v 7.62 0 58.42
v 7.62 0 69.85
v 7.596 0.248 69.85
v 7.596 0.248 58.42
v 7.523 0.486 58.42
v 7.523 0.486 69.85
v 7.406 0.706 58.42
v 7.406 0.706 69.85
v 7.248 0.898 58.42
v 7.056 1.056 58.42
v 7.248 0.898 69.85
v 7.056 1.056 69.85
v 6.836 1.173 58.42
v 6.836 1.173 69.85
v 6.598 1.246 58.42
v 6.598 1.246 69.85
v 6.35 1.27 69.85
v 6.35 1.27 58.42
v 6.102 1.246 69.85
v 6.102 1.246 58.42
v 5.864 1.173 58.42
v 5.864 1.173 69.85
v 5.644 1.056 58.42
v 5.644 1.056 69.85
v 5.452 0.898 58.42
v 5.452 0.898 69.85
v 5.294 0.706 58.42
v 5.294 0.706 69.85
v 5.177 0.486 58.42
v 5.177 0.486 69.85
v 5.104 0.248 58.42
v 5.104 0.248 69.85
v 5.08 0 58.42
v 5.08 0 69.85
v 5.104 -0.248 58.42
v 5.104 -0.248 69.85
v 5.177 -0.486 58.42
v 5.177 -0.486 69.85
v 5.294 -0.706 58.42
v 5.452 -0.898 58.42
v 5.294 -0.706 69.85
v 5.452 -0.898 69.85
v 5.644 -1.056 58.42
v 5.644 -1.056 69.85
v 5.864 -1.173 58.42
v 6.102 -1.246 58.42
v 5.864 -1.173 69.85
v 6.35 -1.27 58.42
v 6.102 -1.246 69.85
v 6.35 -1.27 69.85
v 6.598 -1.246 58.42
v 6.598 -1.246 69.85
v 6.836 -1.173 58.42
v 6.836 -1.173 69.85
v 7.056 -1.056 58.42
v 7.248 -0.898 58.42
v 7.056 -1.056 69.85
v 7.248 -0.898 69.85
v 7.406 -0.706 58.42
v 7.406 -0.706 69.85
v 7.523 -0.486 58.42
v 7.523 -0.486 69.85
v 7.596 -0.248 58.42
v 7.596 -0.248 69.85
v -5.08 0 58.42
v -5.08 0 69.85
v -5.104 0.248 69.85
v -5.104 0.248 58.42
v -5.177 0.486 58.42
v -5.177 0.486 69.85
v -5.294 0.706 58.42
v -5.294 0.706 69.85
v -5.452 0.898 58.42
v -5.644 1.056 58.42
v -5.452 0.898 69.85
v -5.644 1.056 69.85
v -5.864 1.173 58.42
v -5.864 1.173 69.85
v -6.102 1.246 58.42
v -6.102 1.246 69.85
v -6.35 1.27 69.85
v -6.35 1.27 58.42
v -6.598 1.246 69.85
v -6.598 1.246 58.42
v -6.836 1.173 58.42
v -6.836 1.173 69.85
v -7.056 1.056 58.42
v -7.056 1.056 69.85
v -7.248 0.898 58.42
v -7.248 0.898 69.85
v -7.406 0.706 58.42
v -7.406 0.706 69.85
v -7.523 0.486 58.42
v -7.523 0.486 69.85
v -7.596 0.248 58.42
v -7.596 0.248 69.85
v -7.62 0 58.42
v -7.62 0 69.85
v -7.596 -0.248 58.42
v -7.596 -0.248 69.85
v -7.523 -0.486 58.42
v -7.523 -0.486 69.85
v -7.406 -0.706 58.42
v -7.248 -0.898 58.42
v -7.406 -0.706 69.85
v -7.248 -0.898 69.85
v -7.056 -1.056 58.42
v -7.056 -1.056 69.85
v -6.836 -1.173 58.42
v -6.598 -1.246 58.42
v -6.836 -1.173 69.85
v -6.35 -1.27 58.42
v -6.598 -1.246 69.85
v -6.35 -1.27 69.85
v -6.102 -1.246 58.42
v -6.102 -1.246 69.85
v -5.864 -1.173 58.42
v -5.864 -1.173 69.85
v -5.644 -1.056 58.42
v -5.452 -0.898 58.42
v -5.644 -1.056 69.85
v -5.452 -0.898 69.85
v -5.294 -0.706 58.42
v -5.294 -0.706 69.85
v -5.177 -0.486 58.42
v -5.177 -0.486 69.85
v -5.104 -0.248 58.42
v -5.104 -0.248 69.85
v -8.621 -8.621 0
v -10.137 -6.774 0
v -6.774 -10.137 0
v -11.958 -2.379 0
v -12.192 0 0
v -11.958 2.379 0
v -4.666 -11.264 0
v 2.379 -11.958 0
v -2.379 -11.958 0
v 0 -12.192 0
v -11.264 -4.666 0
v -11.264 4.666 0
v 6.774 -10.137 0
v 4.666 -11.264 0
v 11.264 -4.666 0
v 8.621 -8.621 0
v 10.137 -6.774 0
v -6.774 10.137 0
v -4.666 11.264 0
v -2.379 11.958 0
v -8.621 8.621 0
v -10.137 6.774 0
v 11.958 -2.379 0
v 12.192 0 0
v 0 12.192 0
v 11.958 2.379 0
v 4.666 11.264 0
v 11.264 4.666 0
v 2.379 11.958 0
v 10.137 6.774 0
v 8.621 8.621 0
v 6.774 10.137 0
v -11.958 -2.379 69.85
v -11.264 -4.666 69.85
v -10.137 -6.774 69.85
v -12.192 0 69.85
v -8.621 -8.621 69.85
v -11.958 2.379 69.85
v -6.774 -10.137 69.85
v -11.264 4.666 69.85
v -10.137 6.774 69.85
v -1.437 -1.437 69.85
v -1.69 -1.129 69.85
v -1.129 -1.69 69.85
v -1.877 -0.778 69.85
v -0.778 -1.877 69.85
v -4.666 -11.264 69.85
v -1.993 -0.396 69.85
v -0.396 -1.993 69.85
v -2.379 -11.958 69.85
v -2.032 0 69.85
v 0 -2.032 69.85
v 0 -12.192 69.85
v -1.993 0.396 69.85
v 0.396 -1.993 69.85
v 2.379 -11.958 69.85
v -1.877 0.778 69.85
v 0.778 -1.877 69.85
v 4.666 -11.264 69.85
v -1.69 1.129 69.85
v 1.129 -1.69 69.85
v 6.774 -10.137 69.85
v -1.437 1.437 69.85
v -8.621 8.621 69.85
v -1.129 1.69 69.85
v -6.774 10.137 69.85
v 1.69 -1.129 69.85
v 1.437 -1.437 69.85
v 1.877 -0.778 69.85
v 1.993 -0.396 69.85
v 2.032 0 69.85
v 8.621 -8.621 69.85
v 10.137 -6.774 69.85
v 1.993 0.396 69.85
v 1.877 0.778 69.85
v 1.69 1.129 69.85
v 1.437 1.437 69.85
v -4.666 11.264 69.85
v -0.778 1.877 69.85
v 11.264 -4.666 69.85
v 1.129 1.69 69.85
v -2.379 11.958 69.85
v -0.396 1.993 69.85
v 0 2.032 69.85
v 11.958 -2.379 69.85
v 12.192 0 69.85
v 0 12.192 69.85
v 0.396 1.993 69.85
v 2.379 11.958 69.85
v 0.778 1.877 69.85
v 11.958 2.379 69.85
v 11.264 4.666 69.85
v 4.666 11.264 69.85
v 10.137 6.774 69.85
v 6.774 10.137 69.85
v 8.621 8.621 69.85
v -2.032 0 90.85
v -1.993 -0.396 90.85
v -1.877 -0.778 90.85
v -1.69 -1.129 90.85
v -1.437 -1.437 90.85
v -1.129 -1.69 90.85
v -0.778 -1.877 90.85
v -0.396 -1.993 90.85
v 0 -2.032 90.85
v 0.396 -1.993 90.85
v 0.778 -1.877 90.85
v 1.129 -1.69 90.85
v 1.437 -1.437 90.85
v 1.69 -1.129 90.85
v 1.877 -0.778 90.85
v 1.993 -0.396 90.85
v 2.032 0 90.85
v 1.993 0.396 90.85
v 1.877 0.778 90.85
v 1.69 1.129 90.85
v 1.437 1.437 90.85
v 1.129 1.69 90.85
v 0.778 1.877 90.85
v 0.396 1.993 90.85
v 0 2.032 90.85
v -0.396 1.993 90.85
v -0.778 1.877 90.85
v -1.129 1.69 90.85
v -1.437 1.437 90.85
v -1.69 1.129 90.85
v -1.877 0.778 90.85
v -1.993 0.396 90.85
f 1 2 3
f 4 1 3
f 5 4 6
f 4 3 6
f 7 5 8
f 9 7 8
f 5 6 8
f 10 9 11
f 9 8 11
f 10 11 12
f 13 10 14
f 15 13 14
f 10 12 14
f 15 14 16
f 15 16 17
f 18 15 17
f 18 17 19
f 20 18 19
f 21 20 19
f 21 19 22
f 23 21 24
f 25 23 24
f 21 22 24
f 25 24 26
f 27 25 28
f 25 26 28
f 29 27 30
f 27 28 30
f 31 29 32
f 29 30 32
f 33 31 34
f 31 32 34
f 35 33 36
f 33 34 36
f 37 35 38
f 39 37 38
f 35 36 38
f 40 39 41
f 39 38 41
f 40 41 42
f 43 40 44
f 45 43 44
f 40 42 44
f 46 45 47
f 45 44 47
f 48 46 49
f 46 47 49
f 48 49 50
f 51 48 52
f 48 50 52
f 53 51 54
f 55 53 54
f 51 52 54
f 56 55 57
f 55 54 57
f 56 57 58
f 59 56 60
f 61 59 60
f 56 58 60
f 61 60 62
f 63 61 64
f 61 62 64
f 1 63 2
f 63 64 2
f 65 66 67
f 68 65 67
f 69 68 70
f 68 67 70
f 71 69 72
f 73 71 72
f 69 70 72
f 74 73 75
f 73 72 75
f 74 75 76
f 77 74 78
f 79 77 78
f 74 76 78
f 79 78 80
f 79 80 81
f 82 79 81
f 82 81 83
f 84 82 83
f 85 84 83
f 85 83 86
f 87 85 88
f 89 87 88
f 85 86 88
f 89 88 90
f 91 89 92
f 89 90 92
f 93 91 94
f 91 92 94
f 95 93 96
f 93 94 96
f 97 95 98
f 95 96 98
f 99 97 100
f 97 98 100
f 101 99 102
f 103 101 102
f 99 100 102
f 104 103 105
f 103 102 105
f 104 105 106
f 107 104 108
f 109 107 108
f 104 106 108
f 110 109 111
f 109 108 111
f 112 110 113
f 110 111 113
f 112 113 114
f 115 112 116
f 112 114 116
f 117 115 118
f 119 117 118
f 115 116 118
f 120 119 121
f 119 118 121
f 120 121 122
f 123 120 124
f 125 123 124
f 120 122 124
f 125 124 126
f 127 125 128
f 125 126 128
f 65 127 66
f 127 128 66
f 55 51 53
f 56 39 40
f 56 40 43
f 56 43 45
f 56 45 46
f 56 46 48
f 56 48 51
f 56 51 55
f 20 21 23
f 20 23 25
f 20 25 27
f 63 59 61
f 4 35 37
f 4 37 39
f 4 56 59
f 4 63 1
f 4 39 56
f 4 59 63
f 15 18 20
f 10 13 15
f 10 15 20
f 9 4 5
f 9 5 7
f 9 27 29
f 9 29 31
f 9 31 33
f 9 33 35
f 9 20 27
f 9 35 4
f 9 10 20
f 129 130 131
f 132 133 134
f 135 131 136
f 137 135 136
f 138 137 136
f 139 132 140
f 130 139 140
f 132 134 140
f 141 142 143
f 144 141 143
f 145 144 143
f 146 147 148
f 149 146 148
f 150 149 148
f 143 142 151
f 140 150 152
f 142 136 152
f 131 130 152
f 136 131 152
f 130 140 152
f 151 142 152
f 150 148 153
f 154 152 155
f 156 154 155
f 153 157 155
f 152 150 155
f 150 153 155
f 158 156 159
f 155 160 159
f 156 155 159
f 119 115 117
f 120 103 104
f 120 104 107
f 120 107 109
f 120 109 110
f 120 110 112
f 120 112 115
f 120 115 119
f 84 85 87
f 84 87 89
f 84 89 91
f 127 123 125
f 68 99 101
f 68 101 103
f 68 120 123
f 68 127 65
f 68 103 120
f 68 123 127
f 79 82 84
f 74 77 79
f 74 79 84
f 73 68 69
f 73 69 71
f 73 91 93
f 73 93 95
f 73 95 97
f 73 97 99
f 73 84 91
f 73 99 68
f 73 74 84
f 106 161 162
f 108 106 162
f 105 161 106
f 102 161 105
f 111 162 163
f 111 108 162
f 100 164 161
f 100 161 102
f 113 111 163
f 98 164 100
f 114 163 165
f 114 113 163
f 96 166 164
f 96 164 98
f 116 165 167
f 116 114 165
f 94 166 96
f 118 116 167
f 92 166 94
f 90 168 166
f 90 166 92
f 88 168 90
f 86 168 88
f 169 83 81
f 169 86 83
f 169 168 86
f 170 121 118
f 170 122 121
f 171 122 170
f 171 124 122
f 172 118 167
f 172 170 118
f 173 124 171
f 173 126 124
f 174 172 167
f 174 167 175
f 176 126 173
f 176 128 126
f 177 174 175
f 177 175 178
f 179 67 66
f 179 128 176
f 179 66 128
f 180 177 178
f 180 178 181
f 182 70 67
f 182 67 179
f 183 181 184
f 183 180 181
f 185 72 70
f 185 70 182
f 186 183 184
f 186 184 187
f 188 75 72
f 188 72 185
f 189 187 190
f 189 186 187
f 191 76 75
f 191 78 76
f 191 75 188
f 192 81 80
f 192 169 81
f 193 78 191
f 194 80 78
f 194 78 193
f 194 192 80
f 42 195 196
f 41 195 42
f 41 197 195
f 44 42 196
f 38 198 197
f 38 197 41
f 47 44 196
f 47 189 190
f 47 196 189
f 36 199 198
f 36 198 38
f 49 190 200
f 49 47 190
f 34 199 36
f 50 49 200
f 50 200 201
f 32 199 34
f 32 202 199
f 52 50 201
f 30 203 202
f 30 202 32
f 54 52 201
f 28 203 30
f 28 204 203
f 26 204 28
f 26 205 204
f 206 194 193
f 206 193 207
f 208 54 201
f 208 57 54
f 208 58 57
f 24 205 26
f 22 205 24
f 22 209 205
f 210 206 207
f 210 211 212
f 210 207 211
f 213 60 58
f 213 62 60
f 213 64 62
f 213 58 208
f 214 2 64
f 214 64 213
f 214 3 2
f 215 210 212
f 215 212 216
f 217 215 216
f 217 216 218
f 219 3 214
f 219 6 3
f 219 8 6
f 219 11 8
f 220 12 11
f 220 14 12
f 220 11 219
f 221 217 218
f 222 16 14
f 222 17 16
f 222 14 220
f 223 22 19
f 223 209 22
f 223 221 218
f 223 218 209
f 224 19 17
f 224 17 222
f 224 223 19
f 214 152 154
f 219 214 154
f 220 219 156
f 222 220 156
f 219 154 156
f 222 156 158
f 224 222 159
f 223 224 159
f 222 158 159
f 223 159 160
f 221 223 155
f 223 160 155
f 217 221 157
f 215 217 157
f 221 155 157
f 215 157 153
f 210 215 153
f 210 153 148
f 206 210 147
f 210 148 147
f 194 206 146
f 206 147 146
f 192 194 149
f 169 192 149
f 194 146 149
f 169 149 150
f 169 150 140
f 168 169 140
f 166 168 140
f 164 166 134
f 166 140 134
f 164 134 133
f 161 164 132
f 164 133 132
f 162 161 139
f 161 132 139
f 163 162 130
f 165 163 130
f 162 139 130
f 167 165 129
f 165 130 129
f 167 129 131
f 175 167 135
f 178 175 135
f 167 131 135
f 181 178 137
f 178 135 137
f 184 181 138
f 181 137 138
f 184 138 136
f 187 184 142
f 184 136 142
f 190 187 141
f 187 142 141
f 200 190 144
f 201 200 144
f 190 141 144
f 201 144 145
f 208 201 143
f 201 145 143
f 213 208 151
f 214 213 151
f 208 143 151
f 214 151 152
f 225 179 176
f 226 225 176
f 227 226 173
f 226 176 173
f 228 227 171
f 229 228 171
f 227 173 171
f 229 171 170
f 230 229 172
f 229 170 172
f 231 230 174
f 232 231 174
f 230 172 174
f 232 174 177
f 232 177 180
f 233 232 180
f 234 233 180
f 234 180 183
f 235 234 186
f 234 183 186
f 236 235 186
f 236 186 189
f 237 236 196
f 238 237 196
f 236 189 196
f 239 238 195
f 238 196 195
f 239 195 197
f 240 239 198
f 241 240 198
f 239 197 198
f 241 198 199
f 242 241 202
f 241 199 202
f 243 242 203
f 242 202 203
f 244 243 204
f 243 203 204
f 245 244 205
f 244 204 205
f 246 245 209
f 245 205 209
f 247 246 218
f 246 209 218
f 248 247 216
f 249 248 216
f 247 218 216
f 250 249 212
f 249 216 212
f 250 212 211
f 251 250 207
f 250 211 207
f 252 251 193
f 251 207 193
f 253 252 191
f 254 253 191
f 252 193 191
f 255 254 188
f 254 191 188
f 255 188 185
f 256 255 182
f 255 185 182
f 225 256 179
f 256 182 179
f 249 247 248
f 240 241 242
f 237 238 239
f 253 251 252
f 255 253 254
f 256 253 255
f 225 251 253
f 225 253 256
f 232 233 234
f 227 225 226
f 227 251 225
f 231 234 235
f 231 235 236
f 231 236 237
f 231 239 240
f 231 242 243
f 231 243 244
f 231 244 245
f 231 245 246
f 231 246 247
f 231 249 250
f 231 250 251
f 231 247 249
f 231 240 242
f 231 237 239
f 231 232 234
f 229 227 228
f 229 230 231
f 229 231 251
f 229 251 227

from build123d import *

# Parameters (mm, degrees)
SKETCH1_R           = 12.192
BOSS_EXTRUDE1_DEPTH = 69.85
SKETCH2_R           = 2.032
BOSS_EXTRUDE2_DEPTH = 21
SKETCH3_R           = 1.27
CUT_EXTRUDE1_DEPTH  = 11.43


with BuildPart() as part:
    # Sketch1 → Boss-Extrude1 (new body)
    with BuildSketch(Plane.XY):
        Circle(SKETCH1_R)
    extrude(amount=BOSS_EXTRUDE1_DEPTH)

    # Sketch2 → Boss-Extrude2 (add)
    with BuildSketch(Plane.XY.offset(69.85)):
        with Locations(Location((0, 0, 0), (0, 0, 180))):
            Circle(SKETCH2_R)
    extrude(amount=BOSS_EXTRUDE2_DEPTH)

    # Sketch3 → Cut-Extrude1 (cut)
    with BuildSketch(Plane.XY.offset(69.85)):
        with Locations((6.35, 0)):
            Circle(SKETCH3_R)
        with Locations((-6.35, 0)):
            Circle(SKETCH3_R)
    extrude(amount=-CUT_EXTRUDE1_DEPTH, mode=Mode.SUBTRACT)


solid = part.part
